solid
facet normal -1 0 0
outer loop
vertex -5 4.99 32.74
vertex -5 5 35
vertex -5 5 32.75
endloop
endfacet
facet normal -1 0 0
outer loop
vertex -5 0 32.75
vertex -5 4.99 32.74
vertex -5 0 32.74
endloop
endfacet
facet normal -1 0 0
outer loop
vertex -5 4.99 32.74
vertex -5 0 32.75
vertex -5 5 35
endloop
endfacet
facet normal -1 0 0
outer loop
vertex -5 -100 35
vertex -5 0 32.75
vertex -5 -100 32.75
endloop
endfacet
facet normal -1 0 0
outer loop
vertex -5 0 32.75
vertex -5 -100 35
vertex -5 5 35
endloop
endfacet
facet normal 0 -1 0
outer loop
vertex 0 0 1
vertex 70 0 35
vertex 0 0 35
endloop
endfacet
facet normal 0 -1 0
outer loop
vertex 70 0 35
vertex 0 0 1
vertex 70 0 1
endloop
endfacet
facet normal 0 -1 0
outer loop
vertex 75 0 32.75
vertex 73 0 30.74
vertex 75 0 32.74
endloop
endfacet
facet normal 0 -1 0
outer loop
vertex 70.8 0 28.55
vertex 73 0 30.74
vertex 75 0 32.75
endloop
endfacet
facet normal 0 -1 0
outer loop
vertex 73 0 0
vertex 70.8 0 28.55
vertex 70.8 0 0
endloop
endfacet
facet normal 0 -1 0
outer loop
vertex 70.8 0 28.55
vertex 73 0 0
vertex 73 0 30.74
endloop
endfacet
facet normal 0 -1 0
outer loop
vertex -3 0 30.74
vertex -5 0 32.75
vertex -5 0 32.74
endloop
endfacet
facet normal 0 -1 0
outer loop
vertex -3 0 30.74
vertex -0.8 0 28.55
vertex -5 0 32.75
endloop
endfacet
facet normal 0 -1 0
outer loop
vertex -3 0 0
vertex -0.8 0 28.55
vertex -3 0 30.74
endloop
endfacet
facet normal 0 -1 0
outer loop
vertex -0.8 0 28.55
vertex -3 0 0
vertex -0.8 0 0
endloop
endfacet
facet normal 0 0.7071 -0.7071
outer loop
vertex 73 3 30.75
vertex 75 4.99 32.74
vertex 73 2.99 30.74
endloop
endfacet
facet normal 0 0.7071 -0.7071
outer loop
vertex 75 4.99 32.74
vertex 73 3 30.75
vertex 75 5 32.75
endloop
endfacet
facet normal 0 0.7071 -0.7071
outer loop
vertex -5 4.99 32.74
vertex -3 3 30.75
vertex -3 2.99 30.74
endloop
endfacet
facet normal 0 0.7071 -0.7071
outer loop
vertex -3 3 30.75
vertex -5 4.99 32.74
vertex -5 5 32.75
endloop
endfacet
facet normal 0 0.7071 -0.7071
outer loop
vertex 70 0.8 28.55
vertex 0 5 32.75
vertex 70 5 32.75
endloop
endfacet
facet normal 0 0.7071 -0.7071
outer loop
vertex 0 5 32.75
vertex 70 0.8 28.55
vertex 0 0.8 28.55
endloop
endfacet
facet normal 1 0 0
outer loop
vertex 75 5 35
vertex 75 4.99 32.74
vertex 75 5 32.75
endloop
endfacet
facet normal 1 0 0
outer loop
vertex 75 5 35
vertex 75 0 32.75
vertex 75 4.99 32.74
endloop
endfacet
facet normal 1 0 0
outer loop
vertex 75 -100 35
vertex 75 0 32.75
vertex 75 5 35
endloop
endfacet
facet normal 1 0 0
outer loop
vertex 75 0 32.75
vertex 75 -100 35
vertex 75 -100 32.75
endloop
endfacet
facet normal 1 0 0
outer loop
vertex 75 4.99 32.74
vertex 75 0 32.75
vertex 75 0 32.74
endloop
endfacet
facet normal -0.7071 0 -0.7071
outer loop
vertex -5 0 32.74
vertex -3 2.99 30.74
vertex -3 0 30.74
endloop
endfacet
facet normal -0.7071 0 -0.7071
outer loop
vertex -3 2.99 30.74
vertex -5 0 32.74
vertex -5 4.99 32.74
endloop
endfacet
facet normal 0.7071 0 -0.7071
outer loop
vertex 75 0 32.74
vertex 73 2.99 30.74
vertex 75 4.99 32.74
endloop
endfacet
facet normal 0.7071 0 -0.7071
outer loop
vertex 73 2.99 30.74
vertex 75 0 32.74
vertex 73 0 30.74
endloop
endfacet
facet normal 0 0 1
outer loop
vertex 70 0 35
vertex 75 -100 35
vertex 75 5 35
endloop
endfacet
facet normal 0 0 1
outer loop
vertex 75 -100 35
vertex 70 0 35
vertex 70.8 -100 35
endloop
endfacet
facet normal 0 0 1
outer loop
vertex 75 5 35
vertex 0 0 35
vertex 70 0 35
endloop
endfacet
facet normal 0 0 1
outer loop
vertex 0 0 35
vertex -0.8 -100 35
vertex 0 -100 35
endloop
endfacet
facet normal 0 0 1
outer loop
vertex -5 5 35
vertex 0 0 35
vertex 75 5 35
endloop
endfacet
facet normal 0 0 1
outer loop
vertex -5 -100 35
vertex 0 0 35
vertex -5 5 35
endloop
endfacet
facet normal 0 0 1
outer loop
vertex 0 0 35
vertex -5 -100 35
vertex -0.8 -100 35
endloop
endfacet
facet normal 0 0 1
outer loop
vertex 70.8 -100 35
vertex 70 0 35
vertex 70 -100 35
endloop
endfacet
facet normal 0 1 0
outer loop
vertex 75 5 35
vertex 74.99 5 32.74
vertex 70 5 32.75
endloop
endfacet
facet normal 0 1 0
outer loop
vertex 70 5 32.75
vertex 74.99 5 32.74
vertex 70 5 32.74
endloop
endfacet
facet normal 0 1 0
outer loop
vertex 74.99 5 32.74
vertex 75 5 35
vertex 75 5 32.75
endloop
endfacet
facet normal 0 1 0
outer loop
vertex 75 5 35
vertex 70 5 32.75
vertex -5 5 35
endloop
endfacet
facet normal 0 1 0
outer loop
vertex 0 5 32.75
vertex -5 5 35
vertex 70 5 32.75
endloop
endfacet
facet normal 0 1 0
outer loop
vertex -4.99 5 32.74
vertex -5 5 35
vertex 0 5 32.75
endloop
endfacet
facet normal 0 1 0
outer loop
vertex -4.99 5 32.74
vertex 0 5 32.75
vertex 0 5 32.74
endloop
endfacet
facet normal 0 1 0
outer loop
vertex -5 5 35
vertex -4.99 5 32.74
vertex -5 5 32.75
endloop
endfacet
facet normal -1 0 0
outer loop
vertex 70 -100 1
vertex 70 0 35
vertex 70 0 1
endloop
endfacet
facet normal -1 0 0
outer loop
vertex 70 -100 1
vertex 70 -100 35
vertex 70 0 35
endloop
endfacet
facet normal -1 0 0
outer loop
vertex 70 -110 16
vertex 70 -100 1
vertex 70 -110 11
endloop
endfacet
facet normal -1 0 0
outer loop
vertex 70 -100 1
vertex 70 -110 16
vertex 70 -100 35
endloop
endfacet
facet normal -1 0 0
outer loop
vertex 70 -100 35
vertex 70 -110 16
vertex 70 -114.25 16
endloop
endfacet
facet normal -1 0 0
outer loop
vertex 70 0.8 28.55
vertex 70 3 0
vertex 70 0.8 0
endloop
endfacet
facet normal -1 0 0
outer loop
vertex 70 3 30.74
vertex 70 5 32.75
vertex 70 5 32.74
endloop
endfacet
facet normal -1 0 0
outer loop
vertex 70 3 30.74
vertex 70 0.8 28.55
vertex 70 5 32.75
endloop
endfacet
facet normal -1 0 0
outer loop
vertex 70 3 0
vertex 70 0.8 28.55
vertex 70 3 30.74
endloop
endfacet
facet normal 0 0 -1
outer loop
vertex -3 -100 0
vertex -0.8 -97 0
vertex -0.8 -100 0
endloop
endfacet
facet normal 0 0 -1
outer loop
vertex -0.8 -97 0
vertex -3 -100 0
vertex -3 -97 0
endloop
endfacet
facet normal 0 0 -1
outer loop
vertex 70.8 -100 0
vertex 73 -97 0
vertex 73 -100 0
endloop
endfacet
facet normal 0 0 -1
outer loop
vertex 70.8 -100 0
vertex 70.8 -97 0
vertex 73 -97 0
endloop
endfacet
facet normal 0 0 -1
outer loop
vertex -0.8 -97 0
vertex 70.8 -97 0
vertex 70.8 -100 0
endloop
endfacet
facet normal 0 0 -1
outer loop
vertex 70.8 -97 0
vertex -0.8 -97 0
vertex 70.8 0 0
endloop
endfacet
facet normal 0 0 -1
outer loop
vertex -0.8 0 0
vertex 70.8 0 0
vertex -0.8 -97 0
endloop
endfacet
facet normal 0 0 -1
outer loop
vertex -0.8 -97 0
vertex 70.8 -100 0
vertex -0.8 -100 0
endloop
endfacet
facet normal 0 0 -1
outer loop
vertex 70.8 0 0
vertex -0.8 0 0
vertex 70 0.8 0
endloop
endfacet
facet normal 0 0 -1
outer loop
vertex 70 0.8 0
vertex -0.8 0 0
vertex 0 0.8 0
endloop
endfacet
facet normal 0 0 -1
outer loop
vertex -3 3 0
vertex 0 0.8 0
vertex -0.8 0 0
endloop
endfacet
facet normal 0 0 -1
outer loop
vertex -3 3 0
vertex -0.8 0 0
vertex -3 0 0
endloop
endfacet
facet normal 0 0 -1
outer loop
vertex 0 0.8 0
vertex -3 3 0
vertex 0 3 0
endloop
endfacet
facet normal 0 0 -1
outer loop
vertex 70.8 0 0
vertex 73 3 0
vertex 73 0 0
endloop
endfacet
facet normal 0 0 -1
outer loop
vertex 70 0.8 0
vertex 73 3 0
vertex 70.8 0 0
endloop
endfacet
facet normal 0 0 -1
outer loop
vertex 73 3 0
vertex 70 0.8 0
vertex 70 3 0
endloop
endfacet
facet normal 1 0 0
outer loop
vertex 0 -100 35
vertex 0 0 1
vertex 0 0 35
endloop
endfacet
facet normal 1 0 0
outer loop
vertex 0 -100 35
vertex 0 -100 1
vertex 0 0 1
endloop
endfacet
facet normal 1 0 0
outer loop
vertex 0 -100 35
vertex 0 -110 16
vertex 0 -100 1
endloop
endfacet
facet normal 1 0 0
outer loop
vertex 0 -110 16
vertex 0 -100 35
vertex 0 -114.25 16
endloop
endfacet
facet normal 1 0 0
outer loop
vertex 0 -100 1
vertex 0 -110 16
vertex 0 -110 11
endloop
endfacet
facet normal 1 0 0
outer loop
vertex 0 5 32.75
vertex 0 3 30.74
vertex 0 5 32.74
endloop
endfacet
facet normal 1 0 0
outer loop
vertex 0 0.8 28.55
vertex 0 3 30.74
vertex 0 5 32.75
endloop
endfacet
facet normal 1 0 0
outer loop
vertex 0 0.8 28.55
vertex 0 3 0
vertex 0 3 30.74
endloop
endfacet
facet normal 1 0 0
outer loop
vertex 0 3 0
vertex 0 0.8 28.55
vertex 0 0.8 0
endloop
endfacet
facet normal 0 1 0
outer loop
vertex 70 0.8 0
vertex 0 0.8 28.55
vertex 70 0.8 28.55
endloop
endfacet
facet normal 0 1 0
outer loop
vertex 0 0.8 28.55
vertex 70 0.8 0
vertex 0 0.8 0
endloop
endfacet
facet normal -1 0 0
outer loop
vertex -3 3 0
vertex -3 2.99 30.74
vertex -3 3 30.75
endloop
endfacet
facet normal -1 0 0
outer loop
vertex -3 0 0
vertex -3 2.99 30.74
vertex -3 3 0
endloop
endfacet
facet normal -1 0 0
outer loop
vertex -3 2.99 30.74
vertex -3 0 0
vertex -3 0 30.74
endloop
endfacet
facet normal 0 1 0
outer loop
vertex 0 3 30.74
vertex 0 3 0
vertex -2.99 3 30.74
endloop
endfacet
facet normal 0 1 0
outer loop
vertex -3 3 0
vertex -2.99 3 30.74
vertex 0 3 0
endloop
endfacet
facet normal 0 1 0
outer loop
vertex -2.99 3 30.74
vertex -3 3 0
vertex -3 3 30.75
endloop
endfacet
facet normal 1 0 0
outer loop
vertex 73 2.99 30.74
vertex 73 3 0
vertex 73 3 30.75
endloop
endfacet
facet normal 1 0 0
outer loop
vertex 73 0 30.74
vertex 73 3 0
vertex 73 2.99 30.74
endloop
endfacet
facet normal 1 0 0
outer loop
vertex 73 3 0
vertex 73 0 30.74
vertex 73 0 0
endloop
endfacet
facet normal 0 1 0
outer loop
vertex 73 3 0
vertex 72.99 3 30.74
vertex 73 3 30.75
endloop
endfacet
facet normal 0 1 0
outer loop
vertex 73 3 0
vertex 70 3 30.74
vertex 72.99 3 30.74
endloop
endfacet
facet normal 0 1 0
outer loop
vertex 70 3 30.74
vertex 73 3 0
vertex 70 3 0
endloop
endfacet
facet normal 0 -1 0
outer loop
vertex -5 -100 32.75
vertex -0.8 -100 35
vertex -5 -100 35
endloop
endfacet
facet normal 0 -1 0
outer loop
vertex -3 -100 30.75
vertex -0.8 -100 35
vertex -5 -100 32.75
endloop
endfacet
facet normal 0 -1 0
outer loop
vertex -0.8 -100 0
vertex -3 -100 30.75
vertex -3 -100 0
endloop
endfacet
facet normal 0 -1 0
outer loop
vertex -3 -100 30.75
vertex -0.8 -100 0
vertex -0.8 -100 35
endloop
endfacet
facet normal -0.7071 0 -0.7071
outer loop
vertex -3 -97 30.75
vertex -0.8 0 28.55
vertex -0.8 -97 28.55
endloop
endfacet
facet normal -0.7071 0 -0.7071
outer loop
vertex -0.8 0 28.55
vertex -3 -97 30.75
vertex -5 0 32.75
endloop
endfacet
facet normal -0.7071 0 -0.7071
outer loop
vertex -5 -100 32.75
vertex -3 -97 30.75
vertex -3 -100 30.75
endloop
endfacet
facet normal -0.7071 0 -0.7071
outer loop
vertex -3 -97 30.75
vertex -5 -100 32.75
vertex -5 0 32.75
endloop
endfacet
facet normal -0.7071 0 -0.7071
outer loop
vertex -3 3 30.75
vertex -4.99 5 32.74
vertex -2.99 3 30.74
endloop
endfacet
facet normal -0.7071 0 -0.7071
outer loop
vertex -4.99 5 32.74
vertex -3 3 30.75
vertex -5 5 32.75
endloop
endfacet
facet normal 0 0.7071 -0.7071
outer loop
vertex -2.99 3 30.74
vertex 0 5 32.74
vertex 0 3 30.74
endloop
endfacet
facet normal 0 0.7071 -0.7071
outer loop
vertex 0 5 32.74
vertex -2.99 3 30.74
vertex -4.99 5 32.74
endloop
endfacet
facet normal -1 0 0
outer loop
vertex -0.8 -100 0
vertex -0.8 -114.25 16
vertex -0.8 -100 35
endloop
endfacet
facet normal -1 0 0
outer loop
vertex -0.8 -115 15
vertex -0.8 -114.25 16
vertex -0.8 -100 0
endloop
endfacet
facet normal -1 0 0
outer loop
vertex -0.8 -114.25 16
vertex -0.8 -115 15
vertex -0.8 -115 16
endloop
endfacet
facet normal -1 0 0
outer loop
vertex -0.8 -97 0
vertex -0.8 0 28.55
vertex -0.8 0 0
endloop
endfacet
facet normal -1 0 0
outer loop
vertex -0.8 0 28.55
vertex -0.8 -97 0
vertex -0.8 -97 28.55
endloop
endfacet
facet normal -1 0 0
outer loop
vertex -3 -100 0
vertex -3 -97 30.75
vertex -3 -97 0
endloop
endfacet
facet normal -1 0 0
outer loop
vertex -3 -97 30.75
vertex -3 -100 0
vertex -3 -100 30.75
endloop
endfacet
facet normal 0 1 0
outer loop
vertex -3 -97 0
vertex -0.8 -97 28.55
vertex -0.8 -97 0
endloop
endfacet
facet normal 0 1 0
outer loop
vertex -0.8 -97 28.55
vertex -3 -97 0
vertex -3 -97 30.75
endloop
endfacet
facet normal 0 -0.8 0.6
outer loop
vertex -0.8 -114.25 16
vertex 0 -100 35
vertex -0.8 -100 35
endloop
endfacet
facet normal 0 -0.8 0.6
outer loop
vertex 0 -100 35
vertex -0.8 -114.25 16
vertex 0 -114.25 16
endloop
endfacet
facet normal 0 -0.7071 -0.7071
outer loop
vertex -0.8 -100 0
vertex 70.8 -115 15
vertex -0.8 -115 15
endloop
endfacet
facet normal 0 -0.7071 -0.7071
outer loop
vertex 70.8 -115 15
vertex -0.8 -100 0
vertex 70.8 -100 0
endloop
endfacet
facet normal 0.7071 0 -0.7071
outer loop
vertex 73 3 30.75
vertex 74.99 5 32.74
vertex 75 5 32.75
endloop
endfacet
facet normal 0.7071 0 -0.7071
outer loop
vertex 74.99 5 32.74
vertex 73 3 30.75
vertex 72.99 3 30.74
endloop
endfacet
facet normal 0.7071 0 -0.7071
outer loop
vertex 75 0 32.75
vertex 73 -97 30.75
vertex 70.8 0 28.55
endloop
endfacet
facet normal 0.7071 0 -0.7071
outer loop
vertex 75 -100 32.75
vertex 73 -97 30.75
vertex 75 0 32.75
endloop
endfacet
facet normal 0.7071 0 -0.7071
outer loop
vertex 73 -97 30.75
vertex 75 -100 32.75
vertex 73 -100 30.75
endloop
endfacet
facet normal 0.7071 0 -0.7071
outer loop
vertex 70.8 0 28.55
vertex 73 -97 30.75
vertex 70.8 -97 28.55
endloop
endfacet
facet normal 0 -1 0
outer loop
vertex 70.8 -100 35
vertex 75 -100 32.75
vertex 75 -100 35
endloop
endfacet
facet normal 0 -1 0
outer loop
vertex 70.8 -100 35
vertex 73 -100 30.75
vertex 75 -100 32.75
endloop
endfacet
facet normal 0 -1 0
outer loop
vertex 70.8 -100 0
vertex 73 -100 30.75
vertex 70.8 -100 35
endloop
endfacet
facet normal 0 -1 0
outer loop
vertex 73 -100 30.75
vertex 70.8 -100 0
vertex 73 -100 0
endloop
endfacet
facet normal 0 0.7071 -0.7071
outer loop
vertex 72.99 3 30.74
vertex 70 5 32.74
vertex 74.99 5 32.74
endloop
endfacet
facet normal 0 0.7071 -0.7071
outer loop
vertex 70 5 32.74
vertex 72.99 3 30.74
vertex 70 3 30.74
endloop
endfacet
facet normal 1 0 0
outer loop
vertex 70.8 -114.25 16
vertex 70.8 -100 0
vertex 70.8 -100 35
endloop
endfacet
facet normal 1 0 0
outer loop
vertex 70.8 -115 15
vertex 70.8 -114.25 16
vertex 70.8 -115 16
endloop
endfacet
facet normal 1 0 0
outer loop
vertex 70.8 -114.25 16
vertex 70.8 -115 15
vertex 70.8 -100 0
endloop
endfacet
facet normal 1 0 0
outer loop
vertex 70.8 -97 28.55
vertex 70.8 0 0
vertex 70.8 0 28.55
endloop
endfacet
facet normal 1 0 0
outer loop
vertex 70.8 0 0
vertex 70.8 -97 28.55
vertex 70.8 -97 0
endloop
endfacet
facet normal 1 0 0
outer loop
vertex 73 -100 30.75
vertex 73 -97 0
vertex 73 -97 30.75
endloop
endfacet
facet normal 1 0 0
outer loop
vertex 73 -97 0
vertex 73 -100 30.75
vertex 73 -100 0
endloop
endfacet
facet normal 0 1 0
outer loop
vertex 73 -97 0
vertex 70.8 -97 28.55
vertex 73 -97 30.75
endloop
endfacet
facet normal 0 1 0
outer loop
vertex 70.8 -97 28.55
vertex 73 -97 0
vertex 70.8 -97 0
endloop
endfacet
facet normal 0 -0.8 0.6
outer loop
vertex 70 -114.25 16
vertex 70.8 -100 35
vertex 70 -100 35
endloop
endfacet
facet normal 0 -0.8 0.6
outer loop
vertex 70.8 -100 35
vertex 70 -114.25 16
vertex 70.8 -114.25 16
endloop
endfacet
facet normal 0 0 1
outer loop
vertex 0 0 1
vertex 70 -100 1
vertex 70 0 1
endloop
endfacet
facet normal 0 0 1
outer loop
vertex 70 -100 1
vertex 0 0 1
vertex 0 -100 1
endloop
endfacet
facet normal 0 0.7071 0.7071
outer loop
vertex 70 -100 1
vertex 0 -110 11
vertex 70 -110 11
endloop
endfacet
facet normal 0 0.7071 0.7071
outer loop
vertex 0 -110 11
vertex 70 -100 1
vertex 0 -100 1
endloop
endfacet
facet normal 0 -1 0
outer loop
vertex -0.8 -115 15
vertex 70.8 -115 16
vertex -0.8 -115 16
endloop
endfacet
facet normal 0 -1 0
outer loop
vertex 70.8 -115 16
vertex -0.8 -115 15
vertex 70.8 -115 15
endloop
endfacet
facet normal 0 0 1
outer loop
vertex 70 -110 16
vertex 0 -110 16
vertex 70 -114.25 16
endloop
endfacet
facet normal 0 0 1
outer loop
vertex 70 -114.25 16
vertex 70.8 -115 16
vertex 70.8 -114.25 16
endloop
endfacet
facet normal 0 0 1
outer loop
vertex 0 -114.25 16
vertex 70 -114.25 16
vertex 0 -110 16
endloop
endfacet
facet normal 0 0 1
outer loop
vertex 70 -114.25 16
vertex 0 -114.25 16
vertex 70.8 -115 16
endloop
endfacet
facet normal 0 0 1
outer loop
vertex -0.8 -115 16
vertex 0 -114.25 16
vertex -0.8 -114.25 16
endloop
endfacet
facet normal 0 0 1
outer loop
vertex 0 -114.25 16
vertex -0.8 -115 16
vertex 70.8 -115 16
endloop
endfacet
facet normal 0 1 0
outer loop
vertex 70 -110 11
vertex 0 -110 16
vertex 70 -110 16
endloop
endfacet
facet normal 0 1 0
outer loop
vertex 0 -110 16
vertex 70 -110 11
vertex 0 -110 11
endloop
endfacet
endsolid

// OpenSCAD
tWidth = 70;                // Total width of box.
tLength = 100;              // Length of box plus front.
lipHeight = 15;             // Height of lip at front, no taller than tHeight.
tHeight = 35;               // Total height of box.
wallThickness = 0.8;        // Thickness of walls, 0.8mm (two shells) recommended.
columnThickness = 3;        // Thicker support columns helps when walls are thin, no smaller than wallThickness.
lipThickness = 5;           // Depth of lip arond the brim of the box, helps when walls are thin, best to keep above columnThickness.
baseThickness = 1;        // Thickness of the base of the bin.

module back (width, height, cThick, wThick, lThick){
    cube([width,wThick,height]);
    translate([cThick*-1,0,0])
        cube([cThick,cThick,height]);
    translate([width,0,0])
        cube([cThick,cThick,height]);
    union() {
        difference() {
            translate([lThick*-1,0,height-(cThick*3/4)])
                rotate([270,90,270])
                    linear_extrude(height = width + (lThick*2))
                        polygon(points=[[0,0],[lThick,0],[0,lThick]]);
            cCut(tHeight, lipThickness, columnThickness, 0, (lThick+0.01)*-1, -0.1);
            cCut(tHeight, lipThickness, columnThickness, 180, width+lThick+0.01, lThick);
        }
        translate([lThick*-1,0,height-(cThick*3/4)])
            cube([width + (lThick*2),lThick,(cThick*3/4)]);
    }
}

module left (length, height, lHeight, cThick, wThick, lThick){
    translate([wThick*-1,length*-1,0])
        cube([wThick,length,height]);
    translate([cThick*-1,length*-1,0])
        cube([cThick,cThick,height]);
    union() {
        difference() {
            translate([0,(length*-1),height-(cThick*3/4)])
                rotate([270,90,0])
                    linear_extrude(height = length + lThick)
                        polygon(points=[[0,0],[lThick,0],[0,lThick]]);
            cCut(tHeight, lipThickness, columnThickness, 270, (lThick+0.2)*-1, (lThick+0.01));
        }
        translate([lThick*-1,(length*-1),height-(cThick*3/4)])
            cube([lThick,length + lThick,(cThick*3/4)]);
    }
    rotate([0,270,0])
        linear_extrude(height = wThick)
            polygon(points=[[0,length*-1],[height,length*-1],[lHeight,(length + lHeight)*-1]]);
}

module right (length, height, width, lHeight, cThick, wThick, lThick){
    translate([width,length*-1,0])
        cube([wThick,length,height]);
    translate([width,length*-1,0])
        cube([cThick,cThick,height]);
    union() {
        difference() {
            translate([width,lThick,height-(cThick*3/4)])
                rotate([270,90,180])
                    linear_extrude(height = length + lThick)
                        polygon(points=[[0,0],[lThick,0],[0,lThick]]);
            cCut(tHeight, lipThickness, columnThickness, 270, width-0.01, (lThick+0.01));
        }
        translate([width,(length)*-1,height-(cThick*3/4)])
            cube([lThick,length + lThick,(cThick*3/4)]);
    }
    translate([width+wThick,0,0])
        rotate([0,270,0])
            linear_extrude(height = wThick)
                polygon(points=[[0,length*-1],[height,length*-1],[lHeight,(length + lHeight)*-1]]);
}

module bottom (length, height, width, lHeight, lThick, bThick, wThick){
    translate([0,length*-1,0])
        cube([width, length, bThick]);
    translate([width,0,0])
        rotate([0,270,0])
            linear_extrude(height = width)
                polygon(points=[[0,length*-1],[bThick,length*-1],[lHeight+bThick,(lHeight+length)*-1],[lHeight,(lHeight+length)*-1]]);
    translate([width+wThick,0,0])
        rotate([0,270,0])
            linear_extrude(height = width+(wThick*2))
                polygon(points=[[lHeight,(lHeight+length)*-1],[lHeight+bThick,(lHeight+length)*-1],[lHeight+bThick,((lHeight+length)*-1)+lThick],   [lHeight-lThick,(lHeight+length-lThick)*-1]]);
}

module cCut (height, lThick, cThick, zRot, xTrans, yTrans){
    translate([xTrans,yTrans,height-(lThick+cThick*3/4)])
            rotate([270,270,zRot])
                linear_extrude(height = lThick+1)
                    polygon(points=[[0,0],[lThick,0],[0,lThick]]);
}

back(tWidth, tHeight, columnThickness, wallThickness, lipThickness);
left(tLength, tHeight, lipHeight, columnThickness, wallThickness, lipThickness);
right(tLength, tHeight, tWidth, lipHeight, columnThickness, wallThickness, lipThickness);
bottom(tLength, tHeight, tWidth, lipHeight, lipThickness, baseThickness, wallThickness);
